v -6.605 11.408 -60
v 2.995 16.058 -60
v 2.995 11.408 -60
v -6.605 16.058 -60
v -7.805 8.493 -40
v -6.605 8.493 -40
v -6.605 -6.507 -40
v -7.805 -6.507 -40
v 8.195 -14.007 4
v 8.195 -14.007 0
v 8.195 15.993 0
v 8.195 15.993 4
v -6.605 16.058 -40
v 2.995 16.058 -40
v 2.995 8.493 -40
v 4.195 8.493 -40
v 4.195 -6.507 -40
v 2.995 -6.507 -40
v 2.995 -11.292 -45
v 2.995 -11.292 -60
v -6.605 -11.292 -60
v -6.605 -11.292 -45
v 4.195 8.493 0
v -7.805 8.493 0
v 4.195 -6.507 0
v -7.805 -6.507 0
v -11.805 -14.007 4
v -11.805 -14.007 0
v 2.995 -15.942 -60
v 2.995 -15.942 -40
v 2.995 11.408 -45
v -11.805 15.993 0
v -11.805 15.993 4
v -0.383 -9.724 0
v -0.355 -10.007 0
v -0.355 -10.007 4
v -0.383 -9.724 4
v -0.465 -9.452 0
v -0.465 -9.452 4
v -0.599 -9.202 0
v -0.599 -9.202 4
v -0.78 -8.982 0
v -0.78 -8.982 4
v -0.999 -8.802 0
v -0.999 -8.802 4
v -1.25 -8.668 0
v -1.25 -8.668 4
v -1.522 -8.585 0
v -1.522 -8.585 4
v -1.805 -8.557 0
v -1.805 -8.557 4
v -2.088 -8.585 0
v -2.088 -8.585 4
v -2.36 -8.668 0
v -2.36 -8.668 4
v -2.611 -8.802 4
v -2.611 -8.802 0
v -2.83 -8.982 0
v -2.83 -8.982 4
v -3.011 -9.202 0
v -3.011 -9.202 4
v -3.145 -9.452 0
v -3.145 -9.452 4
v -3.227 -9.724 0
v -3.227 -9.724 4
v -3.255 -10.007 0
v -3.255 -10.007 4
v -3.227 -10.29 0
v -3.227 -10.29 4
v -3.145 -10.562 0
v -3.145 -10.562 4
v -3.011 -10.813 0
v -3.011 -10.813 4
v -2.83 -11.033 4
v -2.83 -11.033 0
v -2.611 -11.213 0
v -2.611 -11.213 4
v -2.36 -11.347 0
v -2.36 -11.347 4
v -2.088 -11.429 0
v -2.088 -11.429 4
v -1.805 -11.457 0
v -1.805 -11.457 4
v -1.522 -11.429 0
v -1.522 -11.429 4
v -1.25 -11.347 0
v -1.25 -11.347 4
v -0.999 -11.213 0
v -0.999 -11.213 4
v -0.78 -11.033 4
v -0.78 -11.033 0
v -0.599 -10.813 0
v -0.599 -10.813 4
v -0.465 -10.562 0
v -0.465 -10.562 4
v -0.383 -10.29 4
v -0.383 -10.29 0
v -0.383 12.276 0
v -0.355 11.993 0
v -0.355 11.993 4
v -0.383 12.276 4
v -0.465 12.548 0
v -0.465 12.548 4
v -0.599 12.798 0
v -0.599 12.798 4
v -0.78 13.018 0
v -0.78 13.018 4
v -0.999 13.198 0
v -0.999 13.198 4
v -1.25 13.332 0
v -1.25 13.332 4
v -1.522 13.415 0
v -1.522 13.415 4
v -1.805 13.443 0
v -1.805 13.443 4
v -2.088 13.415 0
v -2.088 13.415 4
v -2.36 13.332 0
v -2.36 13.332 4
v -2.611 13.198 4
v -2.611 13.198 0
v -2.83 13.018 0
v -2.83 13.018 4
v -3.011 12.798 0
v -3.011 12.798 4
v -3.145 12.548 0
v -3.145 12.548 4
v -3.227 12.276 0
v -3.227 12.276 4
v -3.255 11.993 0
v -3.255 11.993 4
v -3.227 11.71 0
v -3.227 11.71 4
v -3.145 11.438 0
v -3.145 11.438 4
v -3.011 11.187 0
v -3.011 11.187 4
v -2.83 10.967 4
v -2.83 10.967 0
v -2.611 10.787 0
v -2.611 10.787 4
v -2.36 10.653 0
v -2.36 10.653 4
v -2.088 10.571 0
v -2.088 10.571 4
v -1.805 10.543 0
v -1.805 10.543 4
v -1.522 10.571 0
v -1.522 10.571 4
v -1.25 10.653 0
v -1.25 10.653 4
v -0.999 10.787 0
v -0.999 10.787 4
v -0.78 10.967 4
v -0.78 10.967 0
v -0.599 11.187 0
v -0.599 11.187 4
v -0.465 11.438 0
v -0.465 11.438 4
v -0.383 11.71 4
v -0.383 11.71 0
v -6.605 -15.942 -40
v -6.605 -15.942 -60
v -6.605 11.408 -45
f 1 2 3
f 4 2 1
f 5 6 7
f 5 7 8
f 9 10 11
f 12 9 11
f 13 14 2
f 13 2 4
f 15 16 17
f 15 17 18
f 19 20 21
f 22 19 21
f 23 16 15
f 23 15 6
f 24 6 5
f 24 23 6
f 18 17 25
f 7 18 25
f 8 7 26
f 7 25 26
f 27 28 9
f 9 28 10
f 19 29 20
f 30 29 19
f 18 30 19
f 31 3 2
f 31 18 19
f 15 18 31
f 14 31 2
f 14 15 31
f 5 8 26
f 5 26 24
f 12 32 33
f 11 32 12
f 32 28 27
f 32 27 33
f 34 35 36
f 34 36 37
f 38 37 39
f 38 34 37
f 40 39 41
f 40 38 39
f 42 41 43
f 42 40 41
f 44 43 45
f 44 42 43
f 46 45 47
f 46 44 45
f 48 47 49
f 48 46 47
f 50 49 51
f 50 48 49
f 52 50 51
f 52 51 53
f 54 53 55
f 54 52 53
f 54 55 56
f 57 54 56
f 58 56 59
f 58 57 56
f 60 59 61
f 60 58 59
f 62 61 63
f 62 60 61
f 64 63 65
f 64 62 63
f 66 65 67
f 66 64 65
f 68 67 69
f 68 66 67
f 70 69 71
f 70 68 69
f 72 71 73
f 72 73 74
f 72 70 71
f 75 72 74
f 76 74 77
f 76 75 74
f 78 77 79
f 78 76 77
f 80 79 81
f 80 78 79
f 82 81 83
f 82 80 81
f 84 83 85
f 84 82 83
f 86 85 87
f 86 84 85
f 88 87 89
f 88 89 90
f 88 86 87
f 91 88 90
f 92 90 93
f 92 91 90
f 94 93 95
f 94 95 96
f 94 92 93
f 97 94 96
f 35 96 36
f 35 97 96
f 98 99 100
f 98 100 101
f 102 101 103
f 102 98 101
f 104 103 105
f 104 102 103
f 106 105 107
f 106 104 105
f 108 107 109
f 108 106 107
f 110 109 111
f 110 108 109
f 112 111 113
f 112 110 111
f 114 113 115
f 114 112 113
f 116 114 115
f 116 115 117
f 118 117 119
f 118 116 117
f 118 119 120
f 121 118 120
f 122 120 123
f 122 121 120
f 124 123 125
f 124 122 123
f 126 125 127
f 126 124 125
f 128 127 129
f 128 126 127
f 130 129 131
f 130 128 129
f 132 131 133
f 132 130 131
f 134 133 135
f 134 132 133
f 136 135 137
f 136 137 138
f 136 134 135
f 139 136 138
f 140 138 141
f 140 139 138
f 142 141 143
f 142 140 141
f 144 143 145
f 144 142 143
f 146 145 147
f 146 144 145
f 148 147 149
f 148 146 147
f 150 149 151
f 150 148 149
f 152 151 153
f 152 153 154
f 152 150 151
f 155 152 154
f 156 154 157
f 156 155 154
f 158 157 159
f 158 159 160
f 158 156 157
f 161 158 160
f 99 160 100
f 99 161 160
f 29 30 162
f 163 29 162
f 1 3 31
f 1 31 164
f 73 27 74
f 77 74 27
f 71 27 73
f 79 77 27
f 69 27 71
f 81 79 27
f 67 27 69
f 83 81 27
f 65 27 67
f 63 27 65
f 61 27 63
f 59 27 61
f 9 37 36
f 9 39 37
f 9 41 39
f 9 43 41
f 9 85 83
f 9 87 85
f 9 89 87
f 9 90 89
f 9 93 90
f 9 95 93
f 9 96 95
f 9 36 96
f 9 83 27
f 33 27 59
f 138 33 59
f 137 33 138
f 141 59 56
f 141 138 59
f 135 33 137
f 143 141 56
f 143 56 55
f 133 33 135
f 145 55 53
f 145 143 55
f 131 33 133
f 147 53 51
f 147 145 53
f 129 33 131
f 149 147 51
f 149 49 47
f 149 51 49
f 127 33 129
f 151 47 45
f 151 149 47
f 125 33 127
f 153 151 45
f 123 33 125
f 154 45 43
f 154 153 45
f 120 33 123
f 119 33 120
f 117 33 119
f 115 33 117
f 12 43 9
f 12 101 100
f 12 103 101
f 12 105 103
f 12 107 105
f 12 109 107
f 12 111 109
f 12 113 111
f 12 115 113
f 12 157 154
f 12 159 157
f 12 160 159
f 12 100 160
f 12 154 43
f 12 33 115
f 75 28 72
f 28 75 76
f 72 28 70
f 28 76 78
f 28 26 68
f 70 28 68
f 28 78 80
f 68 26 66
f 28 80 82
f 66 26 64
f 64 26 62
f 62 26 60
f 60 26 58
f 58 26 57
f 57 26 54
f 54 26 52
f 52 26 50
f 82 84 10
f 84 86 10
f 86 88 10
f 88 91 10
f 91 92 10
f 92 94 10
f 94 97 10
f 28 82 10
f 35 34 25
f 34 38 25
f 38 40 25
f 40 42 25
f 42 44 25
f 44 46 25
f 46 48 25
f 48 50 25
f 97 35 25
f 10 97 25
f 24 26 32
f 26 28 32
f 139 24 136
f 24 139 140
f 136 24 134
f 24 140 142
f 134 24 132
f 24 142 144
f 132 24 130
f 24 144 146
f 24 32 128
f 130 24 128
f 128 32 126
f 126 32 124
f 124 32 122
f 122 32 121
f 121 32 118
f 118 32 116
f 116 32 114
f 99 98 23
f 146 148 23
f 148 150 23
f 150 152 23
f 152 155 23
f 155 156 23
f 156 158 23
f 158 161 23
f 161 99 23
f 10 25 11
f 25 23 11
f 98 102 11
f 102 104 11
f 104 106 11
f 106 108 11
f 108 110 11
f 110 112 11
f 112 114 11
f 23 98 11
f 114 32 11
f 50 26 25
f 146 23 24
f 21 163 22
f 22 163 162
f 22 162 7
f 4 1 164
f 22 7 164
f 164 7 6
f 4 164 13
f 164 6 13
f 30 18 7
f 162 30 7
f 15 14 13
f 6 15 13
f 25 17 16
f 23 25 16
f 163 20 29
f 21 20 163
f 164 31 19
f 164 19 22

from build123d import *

# Parameters (mm, degrees)
SKETCH_1_W          = 20
SKETCH_1_H          = 30
SKETCH_1_R          = 1.45
EXTRUDE_1_DEPTH     = 4
SKETCH_2_W          = 12
SKETCH_2_H          = 15
EXTRUDE_2_DEPTH     = 40
SKETCH_3_W          = 9.6
SKETCH_3_H          = 32
EXTRUDE_3_DEPTH     = 20
SKETCH_4_W          = 9.6
SKETCH_4_H          = 22.7
EXTRUDE_4_DEPTH     = 15
SKETCH_4_2_W        = 9.6
SKETCH_4_2_H        = 22.7
CUT_EXTRUDE_1_DEPTH = 15


with BuildPart() as part:
    # Эскиз1 → Бобышка-Вытянуть1 (new body)
    with BuildSketch(Plane.XY):
        with Locations((-1.805054152, 0.992779783)):
            Rectangle(SKETCH_1_W, SKETCH_1_H)
        with Locations((-1.805054152, 11.992779783)):
            Circle(SKETCH_1_R, mode=Mode.SUBTRACT)
        with Locations((-1.805054152, -10.007220217)):
            Circle(SKETCH_1_R, mode=Mode.SUBTRACT)
    extrude(amount=EXTRUDE_1_DEPTH)

    # Эскиз2 → Бобышка-Вытянуть2 (add)
    with BuildSketch(Plane(origin=(0, 0, 0), x_dir=(-1, 0, 0), z_dir=(0, 0, -1))):
        with Locations((1.805054152, 0.992779783)):
            Rectangle(SKETCH_2_W, SKETCH_2_H)
    extrude(amount=EXTRUDE_2_DEPTH)

    # Эскиз3 → Бобышка-Вытянуть3 (add)
    with BuildSketch(Plane(origin=(0, 0, -40), x_dir=(-1, 0, 0), z_dir=(0, 0, -1))):
        with Locations((1.805054152, 0.05753703)):
            Rectangle(SKETCH_3_W, SKETCH_3_H)
    extrude(amount=EXTRUDE_3_DEPTH)

    # Эскиз4 → Бобышка-Вытянуть4 (add)
    with BuildSketch(Plane(origin=(0, 0, -60), x_dir=(-1, 0, 0), z_dir=(0, 0, -1))):
        with Locations((1.805054152, 0.05753703)):
            Rectangle(SKETCH_4_W, SKETCH_4_H)
    extrude(amount=-EXTRUDE_4_DEPTH)

    # Эскиз4<2> → Вырез-Вытянуть1 (cut)
    with BuildSketch(Plane(origin=(0, 0, -60), x_dir=(-1, 0, 0), z_dir=(0, 0, -1))):
        with Locations((1.805054152, 0.05753703)):
            Rectangle(SKETCH_4_2_W, SKETCH_4_2_H)
    extrude(amount=-CUT_EXTRUDE_1_DEPTH, mode=Mode.SUBTRACT)


solid = part.part
